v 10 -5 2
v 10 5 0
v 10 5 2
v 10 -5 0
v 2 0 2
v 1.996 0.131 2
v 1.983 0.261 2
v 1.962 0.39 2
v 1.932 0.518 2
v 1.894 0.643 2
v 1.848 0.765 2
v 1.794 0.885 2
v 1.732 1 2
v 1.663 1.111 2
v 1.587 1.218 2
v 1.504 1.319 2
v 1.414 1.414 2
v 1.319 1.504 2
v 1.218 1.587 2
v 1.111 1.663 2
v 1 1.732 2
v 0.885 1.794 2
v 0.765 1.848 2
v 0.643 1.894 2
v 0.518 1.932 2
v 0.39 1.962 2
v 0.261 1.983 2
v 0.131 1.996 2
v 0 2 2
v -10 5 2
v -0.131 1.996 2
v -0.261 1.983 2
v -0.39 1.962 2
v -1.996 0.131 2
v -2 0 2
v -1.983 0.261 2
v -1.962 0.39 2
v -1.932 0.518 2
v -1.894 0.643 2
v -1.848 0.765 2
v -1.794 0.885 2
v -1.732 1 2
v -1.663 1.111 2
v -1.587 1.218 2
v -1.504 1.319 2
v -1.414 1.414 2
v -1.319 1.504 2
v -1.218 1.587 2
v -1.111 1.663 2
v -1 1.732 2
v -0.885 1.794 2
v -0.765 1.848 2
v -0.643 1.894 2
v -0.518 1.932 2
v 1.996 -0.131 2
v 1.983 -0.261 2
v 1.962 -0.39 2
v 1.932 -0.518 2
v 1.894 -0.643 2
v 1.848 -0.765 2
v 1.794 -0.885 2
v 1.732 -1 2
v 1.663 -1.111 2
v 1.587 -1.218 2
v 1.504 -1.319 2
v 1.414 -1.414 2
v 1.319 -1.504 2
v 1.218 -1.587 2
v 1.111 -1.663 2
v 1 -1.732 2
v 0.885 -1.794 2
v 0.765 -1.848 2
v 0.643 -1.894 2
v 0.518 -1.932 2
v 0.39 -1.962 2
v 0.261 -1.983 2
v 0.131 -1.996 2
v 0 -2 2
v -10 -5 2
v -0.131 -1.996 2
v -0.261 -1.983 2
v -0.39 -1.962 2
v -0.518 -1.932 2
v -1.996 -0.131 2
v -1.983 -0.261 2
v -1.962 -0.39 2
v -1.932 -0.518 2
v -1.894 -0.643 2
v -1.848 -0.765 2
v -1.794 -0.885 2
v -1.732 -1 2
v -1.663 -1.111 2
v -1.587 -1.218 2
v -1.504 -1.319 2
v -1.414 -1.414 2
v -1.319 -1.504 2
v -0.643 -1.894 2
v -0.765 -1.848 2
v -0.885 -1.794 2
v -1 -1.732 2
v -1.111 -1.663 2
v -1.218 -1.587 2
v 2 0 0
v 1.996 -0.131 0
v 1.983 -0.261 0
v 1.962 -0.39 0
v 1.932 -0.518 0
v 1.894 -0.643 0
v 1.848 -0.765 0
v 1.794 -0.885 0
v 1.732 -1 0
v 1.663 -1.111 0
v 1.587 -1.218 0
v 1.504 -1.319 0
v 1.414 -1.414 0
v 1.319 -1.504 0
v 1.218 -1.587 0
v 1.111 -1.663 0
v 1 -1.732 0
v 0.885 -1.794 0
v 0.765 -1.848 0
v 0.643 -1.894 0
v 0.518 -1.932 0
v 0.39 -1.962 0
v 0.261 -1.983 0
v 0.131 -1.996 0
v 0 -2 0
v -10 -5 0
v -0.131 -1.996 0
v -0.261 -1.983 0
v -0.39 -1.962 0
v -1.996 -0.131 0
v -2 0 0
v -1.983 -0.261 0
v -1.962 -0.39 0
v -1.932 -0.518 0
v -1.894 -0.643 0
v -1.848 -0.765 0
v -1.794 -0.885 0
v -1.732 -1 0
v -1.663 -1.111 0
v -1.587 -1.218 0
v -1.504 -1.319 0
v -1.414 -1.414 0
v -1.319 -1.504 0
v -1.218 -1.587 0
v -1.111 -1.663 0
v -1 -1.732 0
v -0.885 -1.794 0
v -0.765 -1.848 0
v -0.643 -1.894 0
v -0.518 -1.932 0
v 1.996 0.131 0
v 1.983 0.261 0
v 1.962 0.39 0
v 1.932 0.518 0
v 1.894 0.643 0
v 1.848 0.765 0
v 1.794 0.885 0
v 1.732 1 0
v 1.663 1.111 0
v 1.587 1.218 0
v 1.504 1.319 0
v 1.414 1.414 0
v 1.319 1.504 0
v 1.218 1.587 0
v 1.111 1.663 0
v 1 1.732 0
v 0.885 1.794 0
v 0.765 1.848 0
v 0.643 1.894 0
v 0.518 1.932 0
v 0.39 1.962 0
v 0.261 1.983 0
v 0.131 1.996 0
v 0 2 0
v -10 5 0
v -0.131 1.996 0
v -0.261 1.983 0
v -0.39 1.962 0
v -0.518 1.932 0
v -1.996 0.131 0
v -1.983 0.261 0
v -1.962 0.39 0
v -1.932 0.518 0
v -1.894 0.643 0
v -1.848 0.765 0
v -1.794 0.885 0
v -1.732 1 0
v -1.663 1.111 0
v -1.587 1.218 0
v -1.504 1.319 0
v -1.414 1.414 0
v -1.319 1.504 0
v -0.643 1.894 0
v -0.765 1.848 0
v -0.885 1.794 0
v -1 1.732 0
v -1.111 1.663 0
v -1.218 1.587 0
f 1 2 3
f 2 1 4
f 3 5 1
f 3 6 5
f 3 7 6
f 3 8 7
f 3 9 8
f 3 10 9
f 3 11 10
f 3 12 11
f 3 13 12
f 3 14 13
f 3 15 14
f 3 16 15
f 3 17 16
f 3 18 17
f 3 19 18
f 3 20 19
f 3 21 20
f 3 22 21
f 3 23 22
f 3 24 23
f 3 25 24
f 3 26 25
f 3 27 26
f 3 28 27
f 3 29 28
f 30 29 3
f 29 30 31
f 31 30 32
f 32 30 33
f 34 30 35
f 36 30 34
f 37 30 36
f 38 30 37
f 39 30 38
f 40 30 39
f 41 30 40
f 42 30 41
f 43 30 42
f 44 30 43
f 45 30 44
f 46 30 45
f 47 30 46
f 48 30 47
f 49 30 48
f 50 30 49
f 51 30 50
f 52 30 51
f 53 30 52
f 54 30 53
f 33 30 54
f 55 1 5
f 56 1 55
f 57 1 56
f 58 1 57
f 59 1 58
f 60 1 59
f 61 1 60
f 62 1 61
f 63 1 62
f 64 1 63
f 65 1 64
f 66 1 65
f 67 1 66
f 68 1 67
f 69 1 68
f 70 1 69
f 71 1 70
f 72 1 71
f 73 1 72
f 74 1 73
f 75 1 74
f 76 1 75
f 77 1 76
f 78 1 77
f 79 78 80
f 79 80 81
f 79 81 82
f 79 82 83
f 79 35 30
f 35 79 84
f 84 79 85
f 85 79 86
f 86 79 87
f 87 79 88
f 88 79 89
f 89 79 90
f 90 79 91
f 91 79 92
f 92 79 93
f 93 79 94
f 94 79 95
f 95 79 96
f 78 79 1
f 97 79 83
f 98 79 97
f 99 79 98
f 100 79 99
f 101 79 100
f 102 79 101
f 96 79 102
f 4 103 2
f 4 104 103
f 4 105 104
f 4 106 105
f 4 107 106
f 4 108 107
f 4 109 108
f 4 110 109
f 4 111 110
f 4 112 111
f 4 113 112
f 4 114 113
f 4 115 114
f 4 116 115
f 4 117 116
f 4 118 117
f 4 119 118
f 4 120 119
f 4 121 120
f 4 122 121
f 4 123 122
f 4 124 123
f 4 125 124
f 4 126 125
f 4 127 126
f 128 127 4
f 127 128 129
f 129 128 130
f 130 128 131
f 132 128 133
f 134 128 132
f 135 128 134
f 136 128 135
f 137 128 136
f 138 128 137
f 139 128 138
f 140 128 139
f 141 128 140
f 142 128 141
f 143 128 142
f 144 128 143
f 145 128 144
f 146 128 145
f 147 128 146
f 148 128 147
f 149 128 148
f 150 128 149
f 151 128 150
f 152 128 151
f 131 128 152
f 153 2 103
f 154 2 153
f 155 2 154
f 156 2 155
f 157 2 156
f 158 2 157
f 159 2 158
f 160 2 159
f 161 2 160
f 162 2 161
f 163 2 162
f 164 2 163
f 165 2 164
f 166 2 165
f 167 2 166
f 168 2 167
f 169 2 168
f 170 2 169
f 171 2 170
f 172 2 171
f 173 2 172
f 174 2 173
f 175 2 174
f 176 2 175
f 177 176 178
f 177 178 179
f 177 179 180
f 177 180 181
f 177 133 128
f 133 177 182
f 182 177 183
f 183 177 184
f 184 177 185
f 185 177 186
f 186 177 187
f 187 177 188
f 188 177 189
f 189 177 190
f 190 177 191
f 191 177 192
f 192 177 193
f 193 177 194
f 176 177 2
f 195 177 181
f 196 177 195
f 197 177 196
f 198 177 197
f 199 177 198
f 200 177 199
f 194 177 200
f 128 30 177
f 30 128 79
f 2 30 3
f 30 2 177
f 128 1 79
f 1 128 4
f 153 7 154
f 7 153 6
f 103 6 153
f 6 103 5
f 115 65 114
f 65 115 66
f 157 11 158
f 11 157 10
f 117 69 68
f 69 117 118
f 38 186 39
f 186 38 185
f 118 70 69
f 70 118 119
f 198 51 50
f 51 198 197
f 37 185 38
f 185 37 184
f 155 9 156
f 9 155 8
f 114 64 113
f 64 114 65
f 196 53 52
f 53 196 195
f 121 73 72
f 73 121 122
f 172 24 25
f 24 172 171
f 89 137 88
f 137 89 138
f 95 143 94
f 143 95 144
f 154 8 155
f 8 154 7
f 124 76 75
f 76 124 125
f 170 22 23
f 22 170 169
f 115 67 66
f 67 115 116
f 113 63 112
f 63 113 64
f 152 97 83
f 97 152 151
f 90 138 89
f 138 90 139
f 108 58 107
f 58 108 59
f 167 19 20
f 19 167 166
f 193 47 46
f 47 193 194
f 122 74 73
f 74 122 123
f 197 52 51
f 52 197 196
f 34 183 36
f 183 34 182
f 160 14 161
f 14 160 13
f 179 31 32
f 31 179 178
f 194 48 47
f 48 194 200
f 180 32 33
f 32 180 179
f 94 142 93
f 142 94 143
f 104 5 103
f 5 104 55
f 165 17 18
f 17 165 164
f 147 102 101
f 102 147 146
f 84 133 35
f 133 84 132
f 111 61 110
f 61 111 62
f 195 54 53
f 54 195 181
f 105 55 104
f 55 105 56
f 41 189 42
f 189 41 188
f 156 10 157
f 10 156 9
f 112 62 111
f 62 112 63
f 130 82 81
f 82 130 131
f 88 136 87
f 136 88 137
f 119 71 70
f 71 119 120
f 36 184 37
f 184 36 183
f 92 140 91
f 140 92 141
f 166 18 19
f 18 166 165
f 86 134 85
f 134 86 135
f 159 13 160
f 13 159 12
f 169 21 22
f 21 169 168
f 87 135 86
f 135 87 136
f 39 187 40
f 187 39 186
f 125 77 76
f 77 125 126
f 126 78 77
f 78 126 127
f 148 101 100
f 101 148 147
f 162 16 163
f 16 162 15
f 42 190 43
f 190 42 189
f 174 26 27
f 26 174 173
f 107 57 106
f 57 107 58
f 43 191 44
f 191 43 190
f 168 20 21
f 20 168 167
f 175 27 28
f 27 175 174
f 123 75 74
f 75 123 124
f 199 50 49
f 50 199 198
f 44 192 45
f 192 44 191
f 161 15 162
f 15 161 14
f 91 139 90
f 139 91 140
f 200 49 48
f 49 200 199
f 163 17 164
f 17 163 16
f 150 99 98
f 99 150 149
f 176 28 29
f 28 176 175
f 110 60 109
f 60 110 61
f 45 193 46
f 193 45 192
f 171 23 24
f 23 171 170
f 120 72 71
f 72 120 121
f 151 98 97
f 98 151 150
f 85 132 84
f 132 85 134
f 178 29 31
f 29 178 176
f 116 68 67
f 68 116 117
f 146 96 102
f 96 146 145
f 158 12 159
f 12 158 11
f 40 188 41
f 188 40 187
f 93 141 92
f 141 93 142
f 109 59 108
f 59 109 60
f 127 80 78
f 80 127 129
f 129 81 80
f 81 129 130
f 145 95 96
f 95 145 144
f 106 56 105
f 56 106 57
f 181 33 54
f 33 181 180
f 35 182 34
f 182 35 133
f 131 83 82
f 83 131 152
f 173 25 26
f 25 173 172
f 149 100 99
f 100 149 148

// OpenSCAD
// Auto-generated from tests/data/feature_fixtures_manifest.json
// fixture: plate_single_hole
// fixture_type: plate
// description: Single centered hole in a plain plate. Simplest positive hole detection case.
$fn = 96;

plate_size = [20.000000, 10.000000, 2.000000];
plate_origin = [-10.000000, -5.000000, 0.000000];

module through_hole(center, diameter, height) {
  translate(center) cylinder(d=diameter, h=height, center=false);
}

module through_slot(start, end, width, height) {
  hull() {
    through_hole(start, width, height);
    through_hole(end, width, height);
  }
}

module counterbore_hole(center, through_d, bore_d, bore_depth, plate_thickness) {
  translate([center[0], center[1], -0.1])
    cylinder(d=through_d, h=plate_thickness + 0.2, center=false);
  translate([center[0], center[1], plate_thickness - bore_depth])
    cylinder(d=bore_d, h=bore_depth + 0.1, center=false);
}

difference() {
  translate(plate_origin) cube(plate_size);
  through_hole([0.000000, 0.000000, -0.100000], 4.000000, 2.200000);  // hole_0
}
